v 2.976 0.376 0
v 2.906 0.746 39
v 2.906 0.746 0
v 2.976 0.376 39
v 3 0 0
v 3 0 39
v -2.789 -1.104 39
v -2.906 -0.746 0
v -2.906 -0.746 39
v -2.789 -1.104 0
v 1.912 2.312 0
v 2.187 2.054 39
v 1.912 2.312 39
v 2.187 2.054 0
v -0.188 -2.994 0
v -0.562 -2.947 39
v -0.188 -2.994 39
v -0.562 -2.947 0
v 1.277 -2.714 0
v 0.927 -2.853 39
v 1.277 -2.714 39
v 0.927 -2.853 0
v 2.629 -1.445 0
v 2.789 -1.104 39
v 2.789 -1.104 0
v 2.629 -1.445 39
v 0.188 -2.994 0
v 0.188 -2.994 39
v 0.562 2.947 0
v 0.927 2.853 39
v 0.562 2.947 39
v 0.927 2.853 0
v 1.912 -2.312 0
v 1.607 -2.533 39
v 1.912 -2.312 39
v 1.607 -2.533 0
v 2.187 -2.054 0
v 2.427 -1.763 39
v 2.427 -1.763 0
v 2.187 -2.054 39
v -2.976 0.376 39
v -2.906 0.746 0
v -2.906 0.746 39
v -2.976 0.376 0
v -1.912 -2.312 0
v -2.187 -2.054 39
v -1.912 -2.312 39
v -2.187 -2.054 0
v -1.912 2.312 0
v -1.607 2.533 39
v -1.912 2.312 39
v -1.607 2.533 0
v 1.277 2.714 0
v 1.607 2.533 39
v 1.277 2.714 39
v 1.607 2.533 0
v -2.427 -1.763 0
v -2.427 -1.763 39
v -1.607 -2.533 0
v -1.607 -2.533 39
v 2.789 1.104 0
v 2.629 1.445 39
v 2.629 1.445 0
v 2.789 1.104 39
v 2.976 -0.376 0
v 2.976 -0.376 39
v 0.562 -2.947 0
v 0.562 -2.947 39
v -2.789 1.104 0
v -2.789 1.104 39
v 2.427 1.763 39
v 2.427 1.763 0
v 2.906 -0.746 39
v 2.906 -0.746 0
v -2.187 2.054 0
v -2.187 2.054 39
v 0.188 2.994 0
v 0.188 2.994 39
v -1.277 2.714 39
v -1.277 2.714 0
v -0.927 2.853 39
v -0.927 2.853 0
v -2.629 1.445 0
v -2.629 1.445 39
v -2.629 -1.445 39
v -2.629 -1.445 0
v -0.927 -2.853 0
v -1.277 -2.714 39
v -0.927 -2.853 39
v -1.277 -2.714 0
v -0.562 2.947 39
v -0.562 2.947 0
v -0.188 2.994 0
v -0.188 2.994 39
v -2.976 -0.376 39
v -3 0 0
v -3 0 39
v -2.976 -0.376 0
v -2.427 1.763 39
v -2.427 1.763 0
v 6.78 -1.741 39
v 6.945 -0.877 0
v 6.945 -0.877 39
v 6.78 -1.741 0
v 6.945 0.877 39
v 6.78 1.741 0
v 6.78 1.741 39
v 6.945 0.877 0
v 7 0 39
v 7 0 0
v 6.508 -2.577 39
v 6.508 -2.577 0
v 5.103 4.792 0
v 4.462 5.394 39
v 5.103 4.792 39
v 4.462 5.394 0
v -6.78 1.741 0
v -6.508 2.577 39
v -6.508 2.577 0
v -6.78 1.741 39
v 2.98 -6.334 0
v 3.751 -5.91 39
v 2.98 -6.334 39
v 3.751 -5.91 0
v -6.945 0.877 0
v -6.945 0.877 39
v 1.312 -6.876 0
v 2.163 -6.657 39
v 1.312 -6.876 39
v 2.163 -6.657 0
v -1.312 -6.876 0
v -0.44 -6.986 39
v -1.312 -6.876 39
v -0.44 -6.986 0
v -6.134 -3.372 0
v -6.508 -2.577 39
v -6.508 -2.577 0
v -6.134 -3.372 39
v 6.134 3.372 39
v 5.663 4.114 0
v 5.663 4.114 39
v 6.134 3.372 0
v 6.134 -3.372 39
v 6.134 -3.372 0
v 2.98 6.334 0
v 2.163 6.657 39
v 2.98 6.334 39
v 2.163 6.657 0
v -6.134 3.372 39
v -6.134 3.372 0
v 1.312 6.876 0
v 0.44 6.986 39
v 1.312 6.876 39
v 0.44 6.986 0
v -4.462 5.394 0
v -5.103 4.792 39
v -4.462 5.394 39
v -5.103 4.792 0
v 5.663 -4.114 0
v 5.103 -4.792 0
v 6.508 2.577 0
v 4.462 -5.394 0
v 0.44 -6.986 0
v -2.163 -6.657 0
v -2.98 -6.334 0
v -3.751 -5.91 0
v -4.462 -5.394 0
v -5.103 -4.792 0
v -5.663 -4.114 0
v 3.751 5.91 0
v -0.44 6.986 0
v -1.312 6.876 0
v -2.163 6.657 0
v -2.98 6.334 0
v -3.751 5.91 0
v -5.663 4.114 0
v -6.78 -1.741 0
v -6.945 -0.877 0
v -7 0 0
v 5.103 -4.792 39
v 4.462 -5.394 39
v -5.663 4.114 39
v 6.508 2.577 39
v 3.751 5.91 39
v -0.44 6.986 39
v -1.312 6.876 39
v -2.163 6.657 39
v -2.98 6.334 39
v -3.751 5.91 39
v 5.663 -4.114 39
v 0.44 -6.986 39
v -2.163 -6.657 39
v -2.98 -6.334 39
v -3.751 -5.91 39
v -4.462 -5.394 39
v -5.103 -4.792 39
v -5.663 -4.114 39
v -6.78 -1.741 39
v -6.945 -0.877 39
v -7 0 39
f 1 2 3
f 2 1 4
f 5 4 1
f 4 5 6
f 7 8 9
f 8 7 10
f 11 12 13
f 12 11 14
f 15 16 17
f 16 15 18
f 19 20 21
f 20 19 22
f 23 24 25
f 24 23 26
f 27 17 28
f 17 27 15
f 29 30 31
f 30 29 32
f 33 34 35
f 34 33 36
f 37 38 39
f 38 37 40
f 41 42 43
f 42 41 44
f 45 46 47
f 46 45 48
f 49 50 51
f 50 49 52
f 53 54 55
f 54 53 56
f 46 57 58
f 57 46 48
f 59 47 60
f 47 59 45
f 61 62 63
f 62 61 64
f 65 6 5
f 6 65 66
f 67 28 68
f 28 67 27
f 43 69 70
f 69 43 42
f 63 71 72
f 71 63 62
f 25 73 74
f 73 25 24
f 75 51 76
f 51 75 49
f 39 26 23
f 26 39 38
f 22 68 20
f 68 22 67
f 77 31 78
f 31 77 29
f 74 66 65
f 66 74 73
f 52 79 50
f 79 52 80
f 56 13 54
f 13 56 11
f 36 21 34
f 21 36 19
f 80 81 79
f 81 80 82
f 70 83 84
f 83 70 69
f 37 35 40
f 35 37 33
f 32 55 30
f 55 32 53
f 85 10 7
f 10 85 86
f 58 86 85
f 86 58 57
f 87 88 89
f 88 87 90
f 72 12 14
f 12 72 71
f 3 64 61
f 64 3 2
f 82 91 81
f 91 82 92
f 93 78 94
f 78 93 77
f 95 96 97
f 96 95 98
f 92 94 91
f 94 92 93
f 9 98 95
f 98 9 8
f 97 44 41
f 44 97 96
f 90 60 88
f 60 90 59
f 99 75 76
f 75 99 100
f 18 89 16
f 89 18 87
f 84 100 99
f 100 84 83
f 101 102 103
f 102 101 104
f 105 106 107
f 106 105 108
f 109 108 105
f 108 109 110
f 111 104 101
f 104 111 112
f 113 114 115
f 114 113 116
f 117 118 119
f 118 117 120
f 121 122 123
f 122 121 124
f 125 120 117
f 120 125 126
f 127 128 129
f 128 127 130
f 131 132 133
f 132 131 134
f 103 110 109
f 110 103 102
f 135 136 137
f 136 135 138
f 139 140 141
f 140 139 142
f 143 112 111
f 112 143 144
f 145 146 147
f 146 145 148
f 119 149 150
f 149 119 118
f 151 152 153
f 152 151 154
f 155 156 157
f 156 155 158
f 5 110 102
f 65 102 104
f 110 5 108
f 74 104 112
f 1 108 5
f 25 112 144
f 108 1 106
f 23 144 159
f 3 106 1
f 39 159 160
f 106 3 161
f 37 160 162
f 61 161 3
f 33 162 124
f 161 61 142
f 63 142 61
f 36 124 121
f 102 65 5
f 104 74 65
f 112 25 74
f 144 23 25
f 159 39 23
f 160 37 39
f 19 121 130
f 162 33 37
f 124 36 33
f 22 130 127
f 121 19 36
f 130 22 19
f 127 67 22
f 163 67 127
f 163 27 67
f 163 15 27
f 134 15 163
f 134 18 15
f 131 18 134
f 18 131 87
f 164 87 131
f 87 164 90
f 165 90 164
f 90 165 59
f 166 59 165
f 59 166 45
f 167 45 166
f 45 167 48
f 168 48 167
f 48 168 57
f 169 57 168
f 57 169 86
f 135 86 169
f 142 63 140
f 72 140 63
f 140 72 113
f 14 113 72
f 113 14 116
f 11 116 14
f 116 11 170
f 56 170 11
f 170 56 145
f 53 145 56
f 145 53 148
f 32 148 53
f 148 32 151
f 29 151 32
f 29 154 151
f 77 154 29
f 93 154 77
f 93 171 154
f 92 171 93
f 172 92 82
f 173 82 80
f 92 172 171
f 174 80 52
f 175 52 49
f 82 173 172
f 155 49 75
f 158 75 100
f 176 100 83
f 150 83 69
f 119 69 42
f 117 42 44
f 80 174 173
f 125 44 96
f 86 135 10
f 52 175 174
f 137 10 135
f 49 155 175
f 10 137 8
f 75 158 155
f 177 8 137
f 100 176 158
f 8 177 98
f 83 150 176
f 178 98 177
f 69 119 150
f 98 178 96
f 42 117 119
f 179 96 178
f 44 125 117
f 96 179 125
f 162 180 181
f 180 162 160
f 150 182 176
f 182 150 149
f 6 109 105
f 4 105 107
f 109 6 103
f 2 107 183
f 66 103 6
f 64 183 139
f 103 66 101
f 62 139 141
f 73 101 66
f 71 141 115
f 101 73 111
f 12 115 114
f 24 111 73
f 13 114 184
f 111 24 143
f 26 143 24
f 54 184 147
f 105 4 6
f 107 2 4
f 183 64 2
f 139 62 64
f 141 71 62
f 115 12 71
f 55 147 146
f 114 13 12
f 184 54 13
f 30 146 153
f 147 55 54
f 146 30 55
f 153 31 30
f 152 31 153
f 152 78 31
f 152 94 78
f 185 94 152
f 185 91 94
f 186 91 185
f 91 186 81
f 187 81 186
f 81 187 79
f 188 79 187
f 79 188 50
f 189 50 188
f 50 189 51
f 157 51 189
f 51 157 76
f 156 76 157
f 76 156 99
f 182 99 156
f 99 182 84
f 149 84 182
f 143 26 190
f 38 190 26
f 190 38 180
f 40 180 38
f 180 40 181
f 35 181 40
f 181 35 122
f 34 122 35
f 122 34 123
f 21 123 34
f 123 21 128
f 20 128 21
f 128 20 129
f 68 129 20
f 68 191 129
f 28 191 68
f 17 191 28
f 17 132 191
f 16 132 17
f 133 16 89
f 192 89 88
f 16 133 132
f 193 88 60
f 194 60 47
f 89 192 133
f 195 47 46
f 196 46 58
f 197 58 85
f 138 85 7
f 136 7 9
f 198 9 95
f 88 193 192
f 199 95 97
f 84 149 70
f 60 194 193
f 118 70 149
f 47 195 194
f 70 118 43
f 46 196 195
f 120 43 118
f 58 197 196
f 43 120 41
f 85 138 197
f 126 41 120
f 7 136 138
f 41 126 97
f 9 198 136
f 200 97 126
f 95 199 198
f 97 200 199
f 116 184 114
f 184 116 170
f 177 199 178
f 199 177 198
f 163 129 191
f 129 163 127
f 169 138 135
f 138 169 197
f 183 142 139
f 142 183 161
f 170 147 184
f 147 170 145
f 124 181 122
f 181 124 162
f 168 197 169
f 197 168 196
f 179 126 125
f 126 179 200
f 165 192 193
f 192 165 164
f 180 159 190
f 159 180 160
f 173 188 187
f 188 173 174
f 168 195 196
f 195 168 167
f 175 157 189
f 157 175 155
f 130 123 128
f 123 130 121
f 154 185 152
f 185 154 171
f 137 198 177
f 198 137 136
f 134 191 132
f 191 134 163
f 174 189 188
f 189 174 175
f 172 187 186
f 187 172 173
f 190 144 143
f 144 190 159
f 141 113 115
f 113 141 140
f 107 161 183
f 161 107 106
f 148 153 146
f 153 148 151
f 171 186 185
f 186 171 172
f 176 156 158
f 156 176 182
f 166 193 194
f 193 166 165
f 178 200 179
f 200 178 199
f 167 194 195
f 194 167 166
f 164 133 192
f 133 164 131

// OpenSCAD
$fn = 50;


difference() {
	union() {
		cylinder(h = 39, r = 7.0000000000);
	}
	union() {
		translate(v = [0, 0, -100]) {
			cylinder(h = 200, r = 3.0000000000);
		}
		translate(v = [0, 0, -100]) {
			cylinder(h = 200, r = 1.5000000000);
		}
	}
}
